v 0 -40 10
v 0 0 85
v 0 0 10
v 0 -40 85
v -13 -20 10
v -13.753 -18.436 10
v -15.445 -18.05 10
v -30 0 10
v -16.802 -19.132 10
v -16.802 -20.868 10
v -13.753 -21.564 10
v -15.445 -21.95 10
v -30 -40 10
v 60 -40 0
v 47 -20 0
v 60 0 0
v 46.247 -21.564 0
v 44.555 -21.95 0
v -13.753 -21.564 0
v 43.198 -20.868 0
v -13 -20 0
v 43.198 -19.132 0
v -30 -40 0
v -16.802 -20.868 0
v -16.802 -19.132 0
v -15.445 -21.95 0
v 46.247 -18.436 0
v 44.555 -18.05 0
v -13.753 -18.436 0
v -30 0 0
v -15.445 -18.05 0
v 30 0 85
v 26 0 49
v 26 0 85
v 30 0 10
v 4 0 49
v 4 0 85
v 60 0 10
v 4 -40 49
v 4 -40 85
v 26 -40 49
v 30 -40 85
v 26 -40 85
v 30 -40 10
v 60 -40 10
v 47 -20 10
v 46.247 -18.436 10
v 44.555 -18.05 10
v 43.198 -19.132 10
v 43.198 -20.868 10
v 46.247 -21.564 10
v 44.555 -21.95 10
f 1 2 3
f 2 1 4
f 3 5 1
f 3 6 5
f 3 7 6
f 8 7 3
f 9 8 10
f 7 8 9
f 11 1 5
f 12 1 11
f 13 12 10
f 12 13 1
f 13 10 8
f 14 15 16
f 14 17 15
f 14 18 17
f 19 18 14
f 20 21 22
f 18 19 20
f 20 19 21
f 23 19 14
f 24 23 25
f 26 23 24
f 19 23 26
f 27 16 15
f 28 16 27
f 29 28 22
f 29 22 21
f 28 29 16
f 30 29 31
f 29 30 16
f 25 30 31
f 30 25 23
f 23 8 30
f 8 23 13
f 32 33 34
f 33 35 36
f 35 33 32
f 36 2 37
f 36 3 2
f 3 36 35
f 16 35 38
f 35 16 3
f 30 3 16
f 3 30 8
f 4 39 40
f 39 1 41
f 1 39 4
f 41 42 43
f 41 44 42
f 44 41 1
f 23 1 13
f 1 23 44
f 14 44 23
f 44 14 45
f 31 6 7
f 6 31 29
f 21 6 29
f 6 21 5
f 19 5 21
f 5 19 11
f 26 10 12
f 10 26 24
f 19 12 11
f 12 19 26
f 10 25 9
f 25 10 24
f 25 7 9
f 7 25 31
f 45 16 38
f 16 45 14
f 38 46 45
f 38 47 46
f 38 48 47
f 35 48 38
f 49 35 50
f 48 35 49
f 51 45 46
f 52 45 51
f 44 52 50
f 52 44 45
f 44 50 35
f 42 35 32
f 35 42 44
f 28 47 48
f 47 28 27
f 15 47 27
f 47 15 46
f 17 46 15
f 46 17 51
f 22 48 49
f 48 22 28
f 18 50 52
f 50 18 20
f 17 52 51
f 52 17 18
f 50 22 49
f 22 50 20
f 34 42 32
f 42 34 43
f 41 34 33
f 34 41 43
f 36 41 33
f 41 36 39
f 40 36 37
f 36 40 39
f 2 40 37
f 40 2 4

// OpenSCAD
// file: fixation.scad
module fixation() {
    difference(){
        translate([-30,-40,0])
            cube([30,40,10]);
        translate([-15,-20,-1])
            cylinder(20,2,2);
        
    }
    difference(){
        translate([30,-40,0])
            cube([30,40,10]);
        translate([45,-20,-1])
            cylinder(20,2,2);
    }
   
}
// main file
include <fixation.scad>

rotate([90,0,0])
    linear_extrude (height=40, $fn = 200)
        import (file="clips.dxf", layer="3", $fn=200);

fixation();
